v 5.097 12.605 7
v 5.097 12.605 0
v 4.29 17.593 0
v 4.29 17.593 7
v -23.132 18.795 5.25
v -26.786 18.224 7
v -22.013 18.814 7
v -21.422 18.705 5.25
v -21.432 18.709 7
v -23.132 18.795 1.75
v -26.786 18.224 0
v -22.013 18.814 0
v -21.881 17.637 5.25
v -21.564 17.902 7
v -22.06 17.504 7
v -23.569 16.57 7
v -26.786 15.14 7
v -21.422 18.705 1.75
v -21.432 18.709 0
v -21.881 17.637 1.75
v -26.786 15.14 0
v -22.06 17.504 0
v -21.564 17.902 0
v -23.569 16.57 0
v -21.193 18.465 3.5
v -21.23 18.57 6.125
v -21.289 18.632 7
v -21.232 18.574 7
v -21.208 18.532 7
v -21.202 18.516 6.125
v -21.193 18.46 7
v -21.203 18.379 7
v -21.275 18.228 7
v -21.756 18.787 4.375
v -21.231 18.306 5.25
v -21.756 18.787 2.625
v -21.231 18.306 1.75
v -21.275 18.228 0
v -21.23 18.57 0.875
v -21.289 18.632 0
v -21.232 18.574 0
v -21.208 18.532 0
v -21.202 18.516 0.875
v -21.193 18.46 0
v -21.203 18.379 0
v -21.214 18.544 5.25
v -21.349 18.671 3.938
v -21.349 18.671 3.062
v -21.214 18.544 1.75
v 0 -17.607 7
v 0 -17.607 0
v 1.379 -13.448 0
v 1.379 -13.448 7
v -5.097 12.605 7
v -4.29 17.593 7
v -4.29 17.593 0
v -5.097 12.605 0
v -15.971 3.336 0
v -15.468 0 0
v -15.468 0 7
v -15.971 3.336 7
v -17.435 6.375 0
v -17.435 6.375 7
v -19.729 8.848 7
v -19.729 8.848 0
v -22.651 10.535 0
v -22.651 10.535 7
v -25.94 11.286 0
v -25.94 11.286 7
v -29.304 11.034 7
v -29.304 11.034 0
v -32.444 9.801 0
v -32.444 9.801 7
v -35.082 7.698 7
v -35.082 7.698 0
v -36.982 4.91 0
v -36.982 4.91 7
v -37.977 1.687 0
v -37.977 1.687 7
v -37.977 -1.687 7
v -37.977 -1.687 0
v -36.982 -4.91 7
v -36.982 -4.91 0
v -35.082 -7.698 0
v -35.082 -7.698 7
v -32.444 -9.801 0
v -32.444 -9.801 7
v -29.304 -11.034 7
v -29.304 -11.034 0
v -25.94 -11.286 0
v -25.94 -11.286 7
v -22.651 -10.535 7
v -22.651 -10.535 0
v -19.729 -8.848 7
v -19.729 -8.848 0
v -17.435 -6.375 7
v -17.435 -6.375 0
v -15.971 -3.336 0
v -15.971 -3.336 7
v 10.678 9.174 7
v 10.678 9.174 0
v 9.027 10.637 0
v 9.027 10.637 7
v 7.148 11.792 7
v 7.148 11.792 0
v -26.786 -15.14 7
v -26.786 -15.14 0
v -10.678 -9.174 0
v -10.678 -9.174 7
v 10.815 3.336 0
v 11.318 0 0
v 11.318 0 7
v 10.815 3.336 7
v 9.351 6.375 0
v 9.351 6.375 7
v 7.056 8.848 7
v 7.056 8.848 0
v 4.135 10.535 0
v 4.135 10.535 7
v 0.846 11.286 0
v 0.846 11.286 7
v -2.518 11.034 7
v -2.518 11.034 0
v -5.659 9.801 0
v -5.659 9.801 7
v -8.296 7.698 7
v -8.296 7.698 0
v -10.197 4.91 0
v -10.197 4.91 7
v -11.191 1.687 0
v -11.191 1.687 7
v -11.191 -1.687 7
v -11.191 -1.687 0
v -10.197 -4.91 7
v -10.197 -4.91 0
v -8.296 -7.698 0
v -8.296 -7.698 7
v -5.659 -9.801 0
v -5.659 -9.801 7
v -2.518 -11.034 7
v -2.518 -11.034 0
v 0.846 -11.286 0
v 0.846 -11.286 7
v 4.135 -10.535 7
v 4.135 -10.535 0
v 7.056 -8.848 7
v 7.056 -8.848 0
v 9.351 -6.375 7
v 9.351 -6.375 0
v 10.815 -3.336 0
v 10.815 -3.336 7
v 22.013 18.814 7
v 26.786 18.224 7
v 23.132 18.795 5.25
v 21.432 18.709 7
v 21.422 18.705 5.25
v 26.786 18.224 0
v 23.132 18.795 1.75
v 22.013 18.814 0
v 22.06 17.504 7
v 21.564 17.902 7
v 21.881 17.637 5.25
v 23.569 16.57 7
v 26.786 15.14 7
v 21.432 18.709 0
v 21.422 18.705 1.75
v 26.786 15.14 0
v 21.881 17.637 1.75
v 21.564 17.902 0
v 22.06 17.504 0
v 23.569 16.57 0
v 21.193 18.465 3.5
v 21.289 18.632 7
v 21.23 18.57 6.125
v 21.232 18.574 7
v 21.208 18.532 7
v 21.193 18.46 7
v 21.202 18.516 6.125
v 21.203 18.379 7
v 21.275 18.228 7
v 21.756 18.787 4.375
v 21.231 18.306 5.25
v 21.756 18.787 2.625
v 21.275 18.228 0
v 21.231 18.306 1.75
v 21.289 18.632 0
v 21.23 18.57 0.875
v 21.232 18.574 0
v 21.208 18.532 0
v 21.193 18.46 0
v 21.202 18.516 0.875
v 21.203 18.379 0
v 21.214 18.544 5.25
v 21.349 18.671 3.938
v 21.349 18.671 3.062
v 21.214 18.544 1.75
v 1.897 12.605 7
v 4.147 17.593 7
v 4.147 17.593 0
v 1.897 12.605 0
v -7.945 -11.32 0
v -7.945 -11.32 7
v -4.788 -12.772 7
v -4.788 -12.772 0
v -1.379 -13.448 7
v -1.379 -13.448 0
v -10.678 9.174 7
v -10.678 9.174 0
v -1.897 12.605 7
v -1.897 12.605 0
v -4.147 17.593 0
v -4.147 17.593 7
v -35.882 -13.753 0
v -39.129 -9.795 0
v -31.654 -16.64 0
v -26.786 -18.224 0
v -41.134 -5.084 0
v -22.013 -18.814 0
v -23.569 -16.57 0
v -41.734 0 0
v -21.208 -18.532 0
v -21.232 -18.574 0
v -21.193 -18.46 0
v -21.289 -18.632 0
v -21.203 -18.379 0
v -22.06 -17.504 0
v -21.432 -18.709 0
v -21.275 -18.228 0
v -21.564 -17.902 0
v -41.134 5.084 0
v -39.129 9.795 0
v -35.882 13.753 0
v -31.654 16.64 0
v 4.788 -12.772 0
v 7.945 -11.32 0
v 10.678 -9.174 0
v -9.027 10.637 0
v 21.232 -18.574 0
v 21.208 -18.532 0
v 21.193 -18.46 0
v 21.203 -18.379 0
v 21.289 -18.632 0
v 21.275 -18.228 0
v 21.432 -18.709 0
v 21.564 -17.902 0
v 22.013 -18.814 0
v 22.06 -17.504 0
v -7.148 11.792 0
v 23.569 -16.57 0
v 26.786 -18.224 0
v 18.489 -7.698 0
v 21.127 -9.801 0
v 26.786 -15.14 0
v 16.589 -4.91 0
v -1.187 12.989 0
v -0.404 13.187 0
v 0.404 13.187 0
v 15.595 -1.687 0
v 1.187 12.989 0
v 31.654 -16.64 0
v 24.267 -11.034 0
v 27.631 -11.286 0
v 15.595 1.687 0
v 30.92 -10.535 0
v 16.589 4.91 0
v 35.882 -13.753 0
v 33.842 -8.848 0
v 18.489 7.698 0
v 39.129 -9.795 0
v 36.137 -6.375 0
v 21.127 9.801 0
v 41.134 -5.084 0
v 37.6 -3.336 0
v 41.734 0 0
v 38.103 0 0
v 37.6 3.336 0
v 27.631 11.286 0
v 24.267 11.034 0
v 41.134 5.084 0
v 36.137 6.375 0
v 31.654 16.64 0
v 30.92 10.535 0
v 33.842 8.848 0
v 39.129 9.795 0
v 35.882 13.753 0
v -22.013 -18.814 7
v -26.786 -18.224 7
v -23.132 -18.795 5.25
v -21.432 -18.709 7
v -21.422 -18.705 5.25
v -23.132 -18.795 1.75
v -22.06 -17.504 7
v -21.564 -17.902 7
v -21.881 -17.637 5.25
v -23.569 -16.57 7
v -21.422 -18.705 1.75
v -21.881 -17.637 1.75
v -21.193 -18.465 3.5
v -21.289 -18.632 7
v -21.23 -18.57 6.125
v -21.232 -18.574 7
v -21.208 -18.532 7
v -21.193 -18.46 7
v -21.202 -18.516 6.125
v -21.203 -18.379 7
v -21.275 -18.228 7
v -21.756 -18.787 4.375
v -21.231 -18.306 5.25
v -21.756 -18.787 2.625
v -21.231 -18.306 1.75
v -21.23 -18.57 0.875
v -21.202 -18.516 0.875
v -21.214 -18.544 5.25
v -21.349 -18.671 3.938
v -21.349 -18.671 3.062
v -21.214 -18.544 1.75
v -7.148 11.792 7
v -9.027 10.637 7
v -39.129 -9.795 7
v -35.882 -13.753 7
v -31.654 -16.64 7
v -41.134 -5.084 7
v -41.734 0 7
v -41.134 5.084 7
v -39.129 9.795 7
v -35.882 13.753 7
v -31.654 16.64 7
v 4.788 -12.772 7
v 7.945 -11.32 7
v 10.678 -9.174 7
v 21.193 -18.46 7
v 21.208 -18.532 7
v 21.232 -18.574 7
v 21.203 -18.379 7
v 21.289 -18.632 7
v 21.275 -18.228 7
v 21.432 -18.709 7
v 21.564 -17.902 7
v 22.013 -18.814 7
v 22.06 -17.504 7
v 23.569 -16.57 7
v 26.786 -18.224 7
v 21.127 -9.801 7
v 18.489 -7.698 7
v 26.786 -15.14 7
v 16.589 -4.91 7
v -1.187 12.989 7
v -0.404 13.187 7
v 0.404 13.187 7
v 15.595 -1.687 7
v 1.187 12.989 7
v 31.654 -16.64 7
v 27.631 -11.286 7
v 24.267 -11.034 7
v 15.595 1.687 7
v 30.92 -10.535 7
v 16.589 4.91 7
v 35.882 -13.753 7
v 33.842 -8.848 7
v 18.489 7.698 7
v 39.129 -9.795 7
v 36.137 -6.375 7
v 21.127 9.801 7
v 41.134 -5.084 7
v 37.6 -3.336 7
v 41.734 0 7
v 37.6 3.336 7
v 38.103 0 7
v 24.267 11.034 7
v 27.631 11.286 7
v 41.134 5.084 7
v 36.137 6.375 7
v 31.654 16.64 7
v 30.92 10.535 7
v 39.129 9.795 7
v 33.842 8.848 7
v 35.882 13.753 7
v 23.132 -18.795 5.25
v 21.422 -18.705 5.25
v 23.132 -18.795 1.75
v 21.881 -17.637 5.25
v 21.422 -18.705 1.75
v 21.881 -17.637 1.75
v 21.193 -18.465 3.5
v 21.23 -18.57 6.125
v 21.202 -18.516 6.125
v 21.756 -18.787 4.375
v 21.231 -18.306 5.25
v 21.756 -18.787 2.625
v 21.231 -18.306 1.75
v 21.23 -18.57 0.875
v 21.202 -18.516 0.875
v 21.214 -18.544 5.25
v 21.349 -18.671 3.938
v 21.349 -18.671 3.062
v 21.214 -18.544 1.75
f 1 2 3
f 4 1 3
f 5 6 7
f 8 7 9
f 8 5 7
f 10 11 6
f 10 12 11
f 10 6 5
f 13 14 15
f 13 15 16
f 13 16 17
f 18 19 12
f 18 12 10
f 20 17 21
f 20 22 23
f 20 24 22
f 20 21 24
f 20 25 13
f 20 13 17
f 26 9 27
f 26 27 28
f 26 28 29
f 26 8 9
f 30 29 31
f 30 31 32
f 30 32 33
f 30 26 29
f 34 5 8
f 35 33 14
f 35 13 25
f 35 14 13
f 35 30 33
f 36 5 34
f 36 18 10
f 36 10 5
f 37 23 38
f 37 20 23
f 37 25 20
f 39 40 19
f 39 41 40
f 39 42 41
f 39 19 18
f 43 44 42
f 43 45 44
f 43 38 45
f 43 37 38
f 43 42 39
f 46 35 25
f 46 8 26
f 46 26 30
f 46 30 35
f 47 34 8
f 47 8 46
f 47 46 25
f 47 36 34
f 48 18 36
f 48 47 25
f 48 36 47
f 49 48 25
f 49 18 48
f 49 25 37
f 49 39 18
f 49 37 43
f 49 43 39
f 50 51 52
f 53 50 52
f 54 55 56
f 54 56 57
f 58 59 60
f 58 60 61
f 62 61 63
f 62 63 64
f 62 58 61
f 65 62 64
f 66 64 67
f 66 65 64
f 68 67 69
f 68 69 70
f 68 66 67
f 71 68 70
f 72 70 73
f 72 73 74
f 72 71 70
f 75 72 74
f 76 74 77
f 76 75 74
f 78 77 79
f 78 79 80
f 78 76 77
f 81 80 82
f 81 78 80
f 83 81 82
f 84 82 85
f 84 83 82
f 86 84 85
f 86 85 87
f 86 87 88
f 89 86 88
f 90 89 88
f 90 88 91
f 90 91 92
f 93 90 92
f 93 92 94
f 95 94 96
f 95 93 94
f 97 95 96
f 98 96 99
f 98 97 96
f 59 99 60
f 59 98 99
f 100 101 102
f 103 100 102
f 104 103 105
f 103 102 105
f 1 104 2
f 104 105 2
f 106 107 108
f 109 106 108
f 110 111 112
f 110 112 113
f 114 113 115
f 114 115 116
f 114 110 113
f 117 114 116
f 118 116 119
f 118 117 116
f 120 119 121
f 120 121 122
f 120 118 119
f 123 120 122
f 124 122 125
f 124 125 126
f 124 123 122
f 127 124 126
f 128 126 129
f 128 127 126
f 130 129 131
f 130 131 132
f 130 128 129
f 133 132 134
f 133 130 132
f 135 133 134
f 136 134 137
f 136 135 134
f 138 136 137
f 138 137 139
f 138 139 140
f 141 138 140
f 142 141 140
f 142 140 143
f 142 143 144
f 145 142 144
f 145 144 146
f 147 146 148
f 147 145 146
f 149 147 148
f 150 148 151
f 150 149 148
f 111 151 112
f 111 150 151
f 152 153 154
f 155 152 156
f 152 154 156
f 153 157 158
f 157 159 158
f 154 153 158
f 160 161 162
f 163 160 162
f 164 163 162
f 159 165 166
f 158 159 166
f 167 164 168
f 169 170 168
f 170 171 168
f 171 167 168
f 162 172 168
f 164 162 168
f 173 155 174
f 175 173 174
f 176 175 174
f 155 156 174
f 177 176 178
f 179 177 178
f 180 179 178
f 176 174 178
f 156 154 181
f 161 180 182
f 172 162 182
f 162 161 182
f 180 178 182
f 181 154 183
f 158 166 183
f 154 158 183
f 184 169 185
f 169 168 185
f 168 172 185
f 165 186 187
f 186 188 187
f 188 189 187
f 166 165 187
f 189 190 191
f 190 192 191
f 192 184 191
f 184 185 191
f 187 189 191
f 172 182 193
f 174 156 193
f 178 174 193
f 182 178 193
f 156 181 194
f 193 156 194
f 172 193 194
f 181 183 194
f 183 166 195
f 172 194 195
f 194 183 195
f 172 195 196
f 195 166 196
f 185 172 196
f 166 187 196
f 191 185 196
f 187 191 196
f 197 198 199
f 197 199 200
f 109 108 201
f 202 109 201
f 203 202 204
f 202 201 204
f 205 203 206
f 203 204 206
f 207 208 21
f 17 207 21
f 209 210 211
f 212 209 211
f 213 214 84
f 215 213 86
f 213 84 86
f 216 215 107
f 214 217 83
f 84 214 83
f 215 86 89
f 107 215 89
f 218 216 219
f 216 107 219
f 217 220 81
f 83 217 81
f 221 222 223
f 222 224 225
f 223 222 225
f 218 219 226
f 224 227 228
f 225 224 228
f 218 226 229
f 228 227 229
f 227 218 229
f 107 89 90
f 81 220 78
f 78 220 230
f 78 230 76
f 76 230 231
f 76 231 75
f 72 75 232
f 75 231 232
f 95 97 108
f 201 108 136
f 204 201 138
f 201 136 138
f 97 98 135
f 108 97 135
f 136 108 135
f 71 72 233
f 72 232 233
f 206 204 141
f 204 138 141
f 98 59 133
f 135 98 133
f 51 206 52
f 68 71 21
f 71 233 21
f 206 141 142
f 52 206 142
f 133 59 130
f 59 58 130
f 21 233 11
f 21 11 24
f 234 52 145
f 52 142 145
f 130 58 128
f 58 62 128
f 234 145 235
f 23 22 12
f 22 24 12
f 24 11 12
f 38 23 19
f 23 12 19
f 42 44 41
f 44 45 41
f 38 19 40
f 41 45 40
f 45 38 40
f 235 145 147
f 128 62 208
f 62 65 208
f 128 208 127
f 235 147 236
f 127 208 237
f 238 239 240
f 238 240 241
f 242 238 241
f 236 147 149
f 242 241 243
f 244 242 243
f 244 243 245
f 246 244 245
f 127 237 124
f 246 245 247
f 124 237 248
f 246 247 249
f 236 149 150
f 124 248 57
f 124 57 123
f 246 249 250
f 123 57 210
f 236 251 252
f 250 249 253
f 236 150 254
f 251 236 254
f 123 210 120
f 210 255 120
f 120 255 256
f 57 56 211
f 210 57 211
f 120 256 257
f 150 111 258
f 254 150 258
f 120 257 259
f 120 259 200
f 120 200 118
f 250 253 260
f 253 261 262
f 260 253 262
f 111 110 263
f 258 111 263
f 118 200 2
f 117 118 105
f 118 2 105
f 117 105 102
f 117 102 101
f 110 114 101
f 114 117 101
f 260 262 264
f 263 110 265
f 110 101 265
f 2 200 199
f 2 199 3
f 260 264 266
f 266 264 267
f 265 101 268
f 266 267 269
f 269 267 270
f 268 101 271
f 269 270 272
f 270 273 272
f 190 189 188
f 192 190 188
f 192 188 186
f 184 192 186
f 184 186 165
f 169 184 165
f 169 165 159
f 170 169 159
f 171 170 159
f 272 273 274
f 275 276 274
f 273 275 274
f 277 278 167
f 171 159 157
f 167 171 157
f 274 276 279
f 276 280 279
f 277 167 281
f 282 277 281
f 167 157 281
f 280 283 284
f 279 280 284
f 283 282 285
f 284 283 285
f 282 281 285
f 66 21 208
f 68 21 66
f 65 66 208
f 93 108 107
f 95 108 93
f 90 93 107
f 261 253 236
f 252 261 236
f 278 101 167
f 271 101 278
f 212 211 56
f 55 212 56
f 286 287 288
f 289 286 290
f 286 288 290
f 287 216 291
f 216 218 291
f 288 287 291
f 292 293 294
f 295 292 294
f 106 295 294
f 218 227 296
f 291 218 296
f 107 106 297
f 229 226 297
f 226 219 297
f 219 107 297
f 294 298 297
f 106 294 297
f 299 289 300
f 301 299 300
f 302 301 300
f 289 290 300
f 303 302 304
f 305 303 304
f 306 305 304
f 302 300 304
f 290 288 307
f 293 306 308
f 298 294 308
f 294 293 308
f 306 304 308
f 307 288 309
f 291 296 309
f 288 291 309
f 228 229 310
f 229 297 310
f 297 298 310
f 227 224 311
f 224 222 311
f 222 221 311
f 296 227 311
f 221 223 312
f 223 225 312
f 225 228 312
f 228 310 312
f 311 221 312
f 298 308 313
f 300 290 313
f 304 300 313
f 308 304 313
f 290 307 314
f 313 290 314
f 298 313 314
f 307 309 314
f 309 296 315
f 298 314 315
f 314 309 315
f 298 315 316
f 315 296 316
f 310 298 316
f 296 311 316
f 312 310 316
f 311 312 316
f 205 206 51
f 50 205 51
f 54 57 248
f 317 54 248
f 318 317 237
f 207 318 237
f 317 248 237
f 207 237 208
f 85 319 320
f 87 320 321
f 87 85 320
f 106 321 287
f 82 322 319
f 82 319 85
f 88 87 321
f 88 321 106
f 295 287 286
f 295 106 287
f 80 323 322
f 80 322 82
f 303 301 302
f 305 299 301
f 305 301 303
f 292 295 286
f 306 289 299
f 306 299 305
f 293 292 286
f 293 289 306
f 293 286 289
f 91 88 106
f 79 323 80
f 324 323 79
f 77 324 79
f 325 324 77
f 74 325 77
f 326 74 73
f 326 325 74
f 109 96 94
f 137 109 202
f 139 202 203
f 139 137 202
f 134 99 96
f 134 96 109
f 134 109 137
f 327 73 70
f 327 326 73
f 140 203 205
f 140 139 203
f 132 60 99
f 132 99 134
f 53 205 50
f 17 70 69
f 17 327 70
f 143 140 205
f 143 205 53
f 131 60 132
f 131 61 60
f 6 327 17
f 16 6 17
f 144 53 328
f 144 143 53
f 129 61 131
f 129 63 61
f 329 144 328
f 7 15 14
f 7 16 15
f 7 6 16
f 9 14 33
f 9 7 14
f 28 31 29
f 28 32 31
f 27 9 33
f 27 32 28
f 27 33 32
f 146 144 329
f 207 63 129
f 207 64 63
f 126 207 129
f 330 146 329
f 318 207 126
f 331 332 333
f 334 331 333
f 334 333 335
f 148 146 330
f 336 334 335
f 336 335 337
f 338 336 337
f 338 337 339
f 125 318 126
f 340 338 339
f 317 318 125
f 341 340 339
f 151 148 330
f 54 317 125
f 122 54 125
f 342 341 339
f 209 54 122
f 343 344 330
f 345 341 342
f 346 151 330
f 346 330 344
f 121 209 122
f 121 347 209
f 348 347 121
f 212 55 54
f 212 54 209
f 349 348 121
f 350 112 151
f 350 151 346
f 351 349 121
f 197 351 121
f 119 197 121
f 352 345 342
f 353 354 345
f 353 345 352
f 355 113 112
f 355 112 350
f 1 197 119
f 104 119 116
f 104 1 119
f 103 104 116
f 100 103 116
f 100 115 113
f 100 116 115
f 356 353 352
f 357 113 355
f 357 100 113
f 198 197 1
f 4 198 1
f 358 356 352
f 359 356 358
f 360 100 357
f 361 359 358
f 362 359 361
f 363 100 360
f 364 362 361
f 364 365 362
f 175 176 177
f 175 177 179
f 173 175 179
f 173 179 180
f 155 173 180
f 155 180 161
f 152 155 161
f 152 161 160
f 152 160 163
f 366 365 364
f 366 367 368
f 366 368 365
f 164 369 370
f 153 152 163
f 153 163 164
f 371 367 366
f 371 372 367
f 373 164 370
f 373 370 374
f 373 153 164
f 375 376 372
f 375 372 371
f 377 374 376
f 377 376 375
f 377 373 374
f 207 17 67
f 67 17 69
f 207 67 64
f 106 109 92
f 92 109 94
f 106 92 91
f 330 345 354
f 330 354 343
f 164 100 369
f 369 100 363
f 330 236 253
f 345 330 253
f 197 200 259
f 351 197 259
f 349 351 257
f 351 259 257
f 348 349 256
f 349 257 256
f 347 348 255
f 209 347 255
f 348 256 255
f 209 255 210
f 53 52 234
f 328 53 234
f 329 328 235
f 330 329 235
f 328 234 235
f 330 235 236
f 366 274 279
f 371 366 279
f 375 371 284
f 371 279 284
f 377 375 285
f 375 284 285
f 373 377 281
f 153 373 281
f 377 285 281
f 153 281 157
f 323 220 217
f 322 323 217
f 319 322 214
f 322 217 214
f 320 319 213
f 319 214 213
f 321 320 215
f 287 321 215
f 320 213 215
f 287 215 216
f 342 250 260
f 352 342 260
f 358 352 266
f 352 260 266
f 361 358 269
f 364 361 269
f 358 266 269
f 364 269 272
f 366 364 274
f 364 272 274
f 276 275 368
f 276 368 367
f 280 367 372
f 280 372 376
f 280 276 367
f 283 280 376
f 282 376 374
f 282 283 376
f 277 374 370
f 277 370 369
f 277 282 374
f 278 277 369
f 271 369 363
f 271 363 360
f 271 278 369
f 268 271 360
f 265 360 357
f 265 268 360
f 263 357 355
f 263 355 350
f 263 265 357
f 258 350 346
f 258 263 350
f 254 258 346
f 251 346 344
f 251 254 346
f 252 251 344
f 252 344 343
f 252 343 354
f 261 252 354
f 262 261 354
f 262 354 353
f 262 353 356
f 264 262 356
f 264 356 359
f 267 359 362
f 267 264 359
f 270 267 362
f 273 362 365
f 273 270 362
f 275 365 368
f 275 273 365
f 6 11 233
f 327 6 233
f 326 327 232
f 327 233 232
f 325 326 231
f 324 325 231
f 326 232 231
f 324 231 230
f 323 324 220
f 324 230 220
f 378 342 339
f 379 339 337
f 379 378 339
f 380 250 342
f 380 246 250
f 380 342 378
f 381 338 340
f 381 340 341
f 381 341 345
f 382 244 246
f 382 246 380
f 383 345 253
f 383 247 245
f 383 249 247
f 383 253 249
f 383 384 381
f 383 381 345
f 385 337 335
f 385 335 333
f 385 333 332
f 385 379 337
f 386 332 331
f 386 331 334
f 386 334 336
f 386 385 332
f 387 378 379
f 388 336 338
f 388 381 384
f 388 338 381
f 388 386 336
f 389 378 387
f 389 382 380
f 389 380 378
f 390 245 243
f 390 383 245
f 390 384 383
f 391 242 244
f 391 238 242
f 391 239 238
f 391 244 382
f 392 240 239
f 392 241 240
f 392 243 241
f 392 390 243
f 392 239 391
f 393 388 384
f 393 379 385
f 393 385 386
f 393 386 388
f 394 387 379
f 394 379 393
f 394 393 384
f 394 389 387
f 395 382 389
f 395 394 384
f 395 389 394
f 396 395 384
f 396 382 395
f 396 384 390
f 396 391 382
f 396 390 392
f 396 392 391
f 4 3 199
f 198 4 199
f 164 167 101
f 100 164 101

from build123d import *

# Parameters (mm, degrees)
F0_R     = 11.3175
F1_DEPTH = 7


with BuildPart() as f1:
    # F0 (on Top) → F1 (new body)
    with BuildSketch(Plane.XY):
        with BuildLine():
            Line((-4.290395086, 17.5929758698), (-5.0968573363, 12.6047609374))
            ThreePointArc((-5.0968573363, 12.6047609374), (-8.1126471986, 11.2557929743), (-10.6780268252, 9.1740796342))
            Line((-10.6780268252, 9.1740796342), (-26.7856623977, 15.1404356584))
            add(Edge.make_bspline(
                [(-26.7856623977, 18.2235073298), (-24.4614947587, 18.7465790659), (-17.7473041348, 19.5727238501), (-24.8232074873, 15.7483036), (-26.7856623977, 15.1404356584)],
                knots=[0, 0, 0, 0, 0.4812154975, 1, 1, 1, 1], degree=3))
            ThreePointArc((-26.7856623977, 18.2235073298), (-37.6467894522, 11.8899380245), (-41.7342770438, 0))
            ThreePointArc((-41.7342770438, 0), (-37.6467894522, -11.8899380245), (-26.7856623977, -18.2235073298))
            add(Edge.make_bspline(
                [(-26.7856623977, -18.2235073298), (-24.4614947587, -18.7465790659), (-17.7473041348, -19.5727238501), (-24.8232074873, -15.7483036), (-26.7856623977, -15.1404356584)],
                knots=[0, 0, 0, 0, 0.4812154975, 1, 1, 1, 1], degree=3))
            Line((-26.7856623977, -15.1404356584), (-10.6780268252, -9.1740796342))
            ThreePointArc((-10.6780268252, -9.1740796342), (-6.4090636856, -12.1387429064), (-1.3792073587, -13.447872363))
            Line((-1.3792073587, -13.447872363), (0, -17.6072642207))
            Line((0, -17.6072642207), (1.3792073587, -13.447872363))
            ThreePointArc((1.3792073587, -13.447872363), (6.4090636856, -12.1387429064), (10.6780268252, -9.1740796342))
            Line((10.6780268252, -9.1740796342), (26.7856623977, -15.1404356584))
            add(Edge.make_bspline(
                [(26.7856623977, -18.2235073298), (24.4614947587, -18.7465790659), (17.7473041348, -19.5727238501), (24.8232074873, -15.7483036), (26.7856623977, -15.1404356584)],
                knots=[0, 0, 0, 0, 0.4812154975, 1, 1, 1, 1], degree=3))
            ThreePointArc((26.7856623977, -18.2235073298), (37.6467894522, -11.8899380245), (41.7342770438, 0))
            ThreePointArc((41.7342770438, 0), (37.6467894522, 11.8899380245), (26.7856623977, 18.2235073298))
            add(Edge.make_bspline(
                [(26.7856623977, 18.2235073298), (24.4614947587, 18.7465790659), (17.7473041348, 19.5727238501), (24.8232074873, 15.7483036), (26.7856623977, 15.1404356584)],
                knots=[0, 0, 0, 0, 0.4812154975, 1, 1, 1, 1], degree=3))
            Line((26.7856623977, 15.1404356584), (10.6780268252, 9.1740796342))
            ThreePointArc((10.6780268252, 9.1740796342), (8.1126471986, 11.2557929743), (5.0968573363, 12.6047609374))
            Line((5.0968573363, 12.6047609374), (4.290395086, 17.5929758698))
            Line((4.290395086, 17.5929758698), (4.1471831501, 17.5929758698))
            Line((4.1471831501, 17.5929758698), (1.8972994294, 12.6047609374))
            ThreePointArc((1.8972994294, 12.6047609374), (0, 13.2116865157), (-1.8972994294, 12.6047609374))
            Line((-1.8972994294, 12.6047609374), (-4.1471831501, 17.5929758698))
            Line((-4.1471831501, 17.5929758698), (-4.290395086, 17.5929758698))
        make_face()
        with Locations((-26.7856623977, 0)):
            Circle(F0_R, mode=Mode.SUBTRACT)
        Circle(F0_R, mode=Mode.SUBTRACT)
        with Locations((26.7856623977, 0)):
            Circle(F0_R, mode=Mode.SUBTRACT)
    extrude(amount=F1_DEPTH)


solid = f1.part
